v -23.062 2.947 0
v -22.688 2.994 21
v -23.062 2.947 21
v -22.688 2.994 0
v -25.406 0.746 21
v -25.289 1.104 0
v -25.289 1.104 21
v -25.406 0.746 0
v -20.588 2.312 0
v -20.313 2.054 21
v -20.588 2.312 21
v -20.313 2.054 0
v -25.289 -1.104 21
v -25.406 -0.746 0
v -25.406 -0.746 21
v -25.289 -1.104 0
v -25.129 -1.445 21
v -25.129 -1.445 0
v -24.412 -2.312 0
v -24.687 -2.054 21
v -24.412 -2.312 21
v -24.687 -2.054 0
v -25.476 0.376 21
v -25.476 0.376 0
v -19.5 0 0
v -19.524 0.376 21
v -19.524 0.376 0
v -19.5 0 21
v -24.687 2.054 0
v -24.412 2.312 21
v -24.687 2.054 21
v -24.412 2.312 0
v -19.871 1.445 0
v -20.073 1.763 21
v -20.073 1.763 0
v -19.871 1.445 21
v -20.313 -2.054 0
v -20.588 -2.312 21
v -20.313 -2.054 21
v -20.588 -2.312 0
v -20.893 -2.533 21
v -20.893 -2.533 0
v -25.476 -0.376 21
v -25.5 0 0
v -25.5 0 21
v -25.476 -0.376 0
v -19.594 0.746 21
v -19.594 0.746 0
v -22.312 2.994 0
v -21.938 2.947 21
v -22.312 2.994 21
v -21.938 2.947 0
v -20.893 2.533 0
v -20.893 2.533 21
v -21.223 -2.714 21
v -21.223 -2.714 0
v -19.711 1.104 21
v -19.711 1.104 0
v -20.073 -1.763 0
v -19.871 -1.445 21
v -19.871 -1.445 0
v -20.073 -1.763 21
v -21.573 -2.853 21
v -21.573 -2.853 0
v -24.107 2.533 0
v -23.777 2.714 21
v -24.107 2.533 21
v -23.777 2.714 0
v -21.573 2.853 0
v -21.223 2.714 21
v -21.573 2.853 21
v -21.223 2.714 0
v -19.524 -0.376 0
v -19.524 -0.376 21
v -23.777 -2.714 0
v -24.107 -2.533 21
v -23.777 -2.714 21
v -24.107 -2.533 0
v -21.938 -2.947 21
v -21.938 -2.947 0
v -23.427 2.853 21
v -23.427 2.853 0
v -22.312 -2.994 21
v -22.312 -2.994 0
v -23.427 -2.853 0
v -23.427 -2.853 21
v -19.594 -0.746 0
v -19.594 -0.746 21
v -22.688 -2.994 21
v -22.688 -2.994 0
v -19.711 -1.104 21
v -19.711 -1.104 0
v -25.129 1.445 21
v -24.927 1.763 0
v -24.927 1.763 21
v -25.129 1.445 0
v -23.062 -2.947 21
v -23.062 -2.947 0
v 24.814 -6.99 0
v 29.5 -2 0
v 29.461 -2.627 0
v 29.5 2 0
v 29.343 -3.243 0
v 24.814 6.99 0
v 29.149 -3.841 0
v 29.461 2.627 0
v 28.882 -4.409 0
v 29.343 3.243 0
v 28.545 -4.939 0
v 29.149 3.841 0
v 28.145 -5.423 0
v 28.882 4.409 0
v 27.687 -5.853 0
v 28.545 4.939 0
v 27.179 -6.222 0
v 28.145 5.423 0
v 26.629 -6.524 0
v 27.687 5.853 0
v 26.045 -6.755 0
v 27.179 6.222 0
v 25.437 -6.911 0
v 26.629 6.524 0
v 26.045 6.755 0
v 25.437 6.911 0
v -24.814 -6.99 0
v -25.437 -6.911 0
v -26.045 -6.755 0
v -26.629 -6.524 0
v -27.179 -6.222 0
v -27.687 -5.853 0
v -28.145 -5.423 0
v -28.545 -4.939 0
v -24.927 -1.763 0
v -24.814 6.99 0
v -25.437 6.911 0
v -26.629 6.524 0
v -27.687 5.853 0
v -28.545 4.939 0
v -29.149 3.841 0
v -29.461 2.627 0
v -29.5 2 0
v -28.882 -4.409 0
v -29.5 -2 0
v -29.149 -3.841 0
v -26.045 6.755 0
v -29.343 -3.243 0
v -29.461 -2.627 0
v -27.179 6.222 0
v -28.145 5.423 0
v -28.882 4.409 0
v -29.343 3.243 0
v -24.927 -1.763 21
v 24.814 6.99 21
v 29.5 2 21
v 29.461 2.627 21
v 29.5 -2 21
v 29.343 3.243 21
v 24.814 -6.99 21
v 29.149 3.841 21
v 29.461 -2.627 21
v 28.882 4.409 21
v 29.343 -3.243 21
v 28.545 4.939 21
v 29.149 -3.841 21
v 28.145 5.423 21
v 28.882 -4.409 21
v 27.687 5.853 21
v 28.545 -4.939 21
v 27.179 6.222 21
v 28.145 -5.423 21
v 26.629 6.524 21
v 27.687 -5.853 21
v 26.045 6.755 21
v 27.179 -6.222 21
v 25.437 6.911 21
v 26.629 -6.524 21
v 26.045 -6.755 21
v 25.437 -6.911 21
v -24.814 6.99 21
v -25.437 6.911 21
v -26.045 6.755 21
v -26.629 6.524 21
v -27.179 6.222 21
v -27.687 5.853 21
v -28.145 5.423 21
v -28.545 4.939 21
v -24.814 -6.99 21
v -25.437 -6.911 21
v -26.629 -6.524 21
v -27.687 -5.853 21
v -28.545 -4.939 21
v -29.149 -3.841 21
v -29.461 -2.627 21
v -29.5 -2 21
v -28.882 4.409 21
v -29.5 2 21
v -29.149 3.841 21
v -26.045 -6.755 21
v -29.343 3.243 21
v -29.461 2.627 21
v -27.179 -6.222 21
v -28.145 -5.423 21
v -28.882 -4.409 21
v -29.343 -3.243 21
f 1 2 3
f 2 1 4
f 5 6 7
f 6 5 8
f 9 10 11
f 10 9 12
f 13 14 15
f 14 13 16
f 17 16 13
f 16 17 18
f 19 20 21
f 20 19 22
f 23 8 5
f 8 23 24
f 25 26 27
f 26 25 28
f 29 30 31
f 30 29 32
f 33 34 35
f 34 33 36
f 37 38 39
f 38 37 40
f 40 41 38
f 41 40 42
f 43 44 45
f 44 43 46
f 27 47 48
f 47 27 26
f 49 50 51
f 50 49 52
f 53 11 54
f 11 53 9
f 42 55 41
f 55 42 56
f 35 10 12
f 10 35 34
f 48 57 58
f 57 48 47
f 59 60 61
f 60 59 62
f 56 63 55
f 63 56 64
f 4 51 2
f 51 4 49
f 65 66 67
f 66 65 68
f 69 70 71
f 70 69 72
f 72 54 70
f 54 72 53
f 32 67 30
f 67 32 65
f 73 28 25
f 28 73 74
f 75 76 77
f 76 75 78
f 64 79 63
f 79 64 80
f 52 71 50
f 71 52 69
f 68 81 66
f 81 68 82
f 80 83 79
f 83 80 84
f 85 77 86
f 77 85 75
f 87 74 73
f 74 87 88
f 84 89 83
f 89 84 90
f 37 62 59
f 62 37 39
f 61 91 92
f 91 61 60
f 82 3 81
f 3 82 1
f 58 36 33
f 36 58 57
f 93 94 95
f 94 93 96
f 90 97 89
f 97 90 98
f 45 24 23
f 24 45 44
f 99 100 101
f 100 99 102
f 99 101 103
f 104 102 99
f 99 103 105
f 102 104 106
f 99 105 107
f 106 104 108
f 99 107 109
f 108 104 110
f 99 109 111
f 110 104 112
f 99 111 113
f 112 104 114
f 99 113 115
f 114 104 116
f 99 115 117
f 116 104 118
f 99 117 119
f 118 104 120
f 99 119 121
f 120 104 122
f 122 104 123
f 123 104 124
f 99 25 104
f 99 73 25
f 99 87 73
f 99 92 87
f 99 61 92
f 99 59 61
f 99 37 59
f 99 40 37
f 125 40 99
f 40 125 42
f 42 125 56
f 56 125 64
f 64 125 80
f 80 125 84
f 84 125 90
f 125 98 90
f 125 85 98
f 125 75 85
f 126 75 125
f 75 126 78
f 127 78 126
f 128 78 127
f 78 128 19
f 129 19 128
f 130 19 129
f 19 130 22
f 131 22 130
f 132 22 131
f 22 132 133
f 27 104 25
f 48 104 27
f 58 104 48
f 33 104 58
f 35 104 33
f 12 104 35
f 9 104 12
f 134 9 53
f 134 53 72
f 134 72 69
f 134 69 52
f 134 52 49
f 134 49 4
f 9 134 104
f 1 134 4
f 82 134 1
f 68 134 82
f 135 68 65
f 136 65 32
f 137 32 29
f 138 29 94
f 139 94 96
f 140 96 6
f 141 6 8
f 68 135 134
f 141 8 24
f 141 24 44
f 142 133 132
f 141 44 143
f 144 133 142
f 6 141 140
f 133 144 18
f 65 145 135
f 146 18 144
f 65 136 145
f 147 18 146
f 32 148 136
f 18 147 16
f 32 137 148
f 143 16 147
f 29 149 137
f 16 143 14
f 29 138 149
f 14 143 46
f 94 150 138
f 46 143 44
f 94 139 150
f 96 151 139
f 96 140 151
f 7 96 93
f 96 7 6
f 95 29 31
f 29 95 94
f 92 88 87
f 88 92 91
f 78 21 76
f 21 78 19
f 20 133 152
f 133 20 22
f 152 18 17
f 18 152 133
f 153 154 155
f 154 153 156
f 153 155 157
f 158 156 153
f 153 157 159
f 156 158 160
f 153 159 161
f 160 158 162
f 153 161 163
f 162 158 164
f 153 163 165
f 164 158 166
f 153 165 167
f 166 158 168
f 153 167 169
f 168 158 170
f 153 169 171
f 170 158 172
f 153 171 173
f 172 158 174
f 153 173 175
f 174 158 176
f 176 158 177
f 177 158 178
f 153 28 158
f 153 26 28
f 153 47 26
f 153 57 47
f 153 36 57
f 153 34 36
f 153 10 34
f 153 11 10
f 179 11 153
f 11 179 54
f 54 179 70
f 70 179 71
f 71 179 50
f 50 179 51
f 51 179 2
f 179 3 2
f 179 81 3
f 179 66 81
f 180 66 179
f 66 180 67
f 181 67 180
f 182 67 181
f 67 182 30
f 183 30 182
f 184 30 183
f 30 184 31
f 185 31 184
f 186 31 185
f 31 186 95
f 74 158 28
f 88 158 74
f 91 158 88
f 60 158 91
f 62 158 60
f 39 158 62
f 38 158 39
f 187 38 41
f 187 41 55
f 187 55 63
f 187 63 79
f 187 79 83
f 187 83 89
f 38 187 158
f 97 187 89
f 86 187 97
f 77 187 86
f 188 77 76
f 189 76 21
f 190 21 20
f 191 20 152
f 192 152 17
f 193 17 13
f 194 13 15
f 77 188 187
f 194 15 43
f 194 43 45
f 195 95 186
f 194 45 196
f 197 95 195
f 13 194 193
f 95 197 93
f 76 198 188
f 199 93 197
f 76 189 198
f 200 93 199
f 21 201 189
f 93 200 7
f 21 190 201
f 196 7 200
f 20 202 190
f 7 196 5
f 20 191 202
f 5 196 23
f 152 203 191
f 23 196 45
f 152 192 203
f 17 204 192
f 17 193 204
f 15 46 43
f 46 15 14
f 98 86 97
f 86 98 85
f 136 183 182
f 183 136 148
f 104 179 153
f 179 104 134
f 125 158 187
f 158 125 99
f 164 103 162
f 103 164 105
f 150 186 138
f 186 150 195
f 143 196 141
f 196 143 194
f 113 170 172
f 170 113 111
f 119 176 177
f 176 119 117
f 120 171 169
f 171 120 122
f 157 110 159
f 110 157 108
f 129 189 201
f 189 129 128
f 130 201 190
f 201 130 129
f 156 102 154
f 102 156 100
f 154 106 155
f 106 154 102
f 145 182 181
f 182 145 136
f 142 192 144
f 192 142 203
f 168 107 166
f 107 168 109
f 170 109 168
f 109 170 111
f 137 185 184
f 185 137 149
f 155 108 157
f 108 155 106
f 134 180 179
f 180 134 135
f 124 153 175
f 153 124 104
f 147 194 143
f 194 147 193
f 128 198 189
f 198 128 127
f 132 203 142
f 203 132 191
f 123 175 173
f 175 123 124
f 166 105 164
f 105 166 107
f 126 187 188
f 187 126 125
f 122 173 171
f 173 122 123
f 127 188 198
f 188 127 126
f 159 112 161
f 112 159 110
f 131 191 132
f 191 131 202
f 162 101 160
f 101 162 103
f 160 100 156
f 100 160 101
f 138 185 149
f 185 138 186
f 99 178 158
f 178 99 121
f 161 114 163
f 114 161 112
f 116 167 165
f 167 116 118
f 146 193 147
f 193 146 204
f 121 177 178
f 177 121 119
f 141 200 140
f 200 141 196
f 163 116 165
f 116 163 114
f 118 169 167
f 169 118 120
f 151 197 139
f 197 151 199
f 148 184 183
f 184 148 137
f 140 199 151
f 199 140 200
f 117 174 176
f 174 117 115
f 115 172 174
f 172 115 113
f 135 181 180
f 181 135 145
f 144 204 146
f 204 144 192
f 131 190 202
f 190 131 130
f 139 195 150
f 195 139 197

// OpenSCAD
$fn = 50;


difference() {
	union() {
		hull() {
			translate(v = [-24.5000000000, 2.0000000000, 0]) {
				cylinder(h = 21, r = 5);
			}
			translate(v = [24.5000000000, 2.0000000000, 0]) {
				cylinder(h = 21, r = 5);
			}
			translate(v = [-24.5000000000, -2.0000000000, 0]) {
				cylinder(h = 21, r = 5);
			}
			translate(v = [24.5000000000, -2.0000000000, 0]) {
				cylinder(h = 21, r = 5);
			}
		}
	}
	union() {
		translate(v = [-22.5000000000, 0.0000000000, 0]) {
			cylinder(h = 21, r = 3.0000000000);
		}
		translate(v = [-22.5000000000, 0.0000000000, 0]) {
			cylinder(h = 21, r = 1.5000000000);
		}
		translate(v = [-22.5000000000, 0.0000000000, 0]) {
			cylinder(h = 21, r = 1.5000000000);
		}
		translate(v = [-22.5000000000, 0.0000000000, 0]) {
			cylinder(h = 21, r = 1.5000000000);
		}
	}
}
